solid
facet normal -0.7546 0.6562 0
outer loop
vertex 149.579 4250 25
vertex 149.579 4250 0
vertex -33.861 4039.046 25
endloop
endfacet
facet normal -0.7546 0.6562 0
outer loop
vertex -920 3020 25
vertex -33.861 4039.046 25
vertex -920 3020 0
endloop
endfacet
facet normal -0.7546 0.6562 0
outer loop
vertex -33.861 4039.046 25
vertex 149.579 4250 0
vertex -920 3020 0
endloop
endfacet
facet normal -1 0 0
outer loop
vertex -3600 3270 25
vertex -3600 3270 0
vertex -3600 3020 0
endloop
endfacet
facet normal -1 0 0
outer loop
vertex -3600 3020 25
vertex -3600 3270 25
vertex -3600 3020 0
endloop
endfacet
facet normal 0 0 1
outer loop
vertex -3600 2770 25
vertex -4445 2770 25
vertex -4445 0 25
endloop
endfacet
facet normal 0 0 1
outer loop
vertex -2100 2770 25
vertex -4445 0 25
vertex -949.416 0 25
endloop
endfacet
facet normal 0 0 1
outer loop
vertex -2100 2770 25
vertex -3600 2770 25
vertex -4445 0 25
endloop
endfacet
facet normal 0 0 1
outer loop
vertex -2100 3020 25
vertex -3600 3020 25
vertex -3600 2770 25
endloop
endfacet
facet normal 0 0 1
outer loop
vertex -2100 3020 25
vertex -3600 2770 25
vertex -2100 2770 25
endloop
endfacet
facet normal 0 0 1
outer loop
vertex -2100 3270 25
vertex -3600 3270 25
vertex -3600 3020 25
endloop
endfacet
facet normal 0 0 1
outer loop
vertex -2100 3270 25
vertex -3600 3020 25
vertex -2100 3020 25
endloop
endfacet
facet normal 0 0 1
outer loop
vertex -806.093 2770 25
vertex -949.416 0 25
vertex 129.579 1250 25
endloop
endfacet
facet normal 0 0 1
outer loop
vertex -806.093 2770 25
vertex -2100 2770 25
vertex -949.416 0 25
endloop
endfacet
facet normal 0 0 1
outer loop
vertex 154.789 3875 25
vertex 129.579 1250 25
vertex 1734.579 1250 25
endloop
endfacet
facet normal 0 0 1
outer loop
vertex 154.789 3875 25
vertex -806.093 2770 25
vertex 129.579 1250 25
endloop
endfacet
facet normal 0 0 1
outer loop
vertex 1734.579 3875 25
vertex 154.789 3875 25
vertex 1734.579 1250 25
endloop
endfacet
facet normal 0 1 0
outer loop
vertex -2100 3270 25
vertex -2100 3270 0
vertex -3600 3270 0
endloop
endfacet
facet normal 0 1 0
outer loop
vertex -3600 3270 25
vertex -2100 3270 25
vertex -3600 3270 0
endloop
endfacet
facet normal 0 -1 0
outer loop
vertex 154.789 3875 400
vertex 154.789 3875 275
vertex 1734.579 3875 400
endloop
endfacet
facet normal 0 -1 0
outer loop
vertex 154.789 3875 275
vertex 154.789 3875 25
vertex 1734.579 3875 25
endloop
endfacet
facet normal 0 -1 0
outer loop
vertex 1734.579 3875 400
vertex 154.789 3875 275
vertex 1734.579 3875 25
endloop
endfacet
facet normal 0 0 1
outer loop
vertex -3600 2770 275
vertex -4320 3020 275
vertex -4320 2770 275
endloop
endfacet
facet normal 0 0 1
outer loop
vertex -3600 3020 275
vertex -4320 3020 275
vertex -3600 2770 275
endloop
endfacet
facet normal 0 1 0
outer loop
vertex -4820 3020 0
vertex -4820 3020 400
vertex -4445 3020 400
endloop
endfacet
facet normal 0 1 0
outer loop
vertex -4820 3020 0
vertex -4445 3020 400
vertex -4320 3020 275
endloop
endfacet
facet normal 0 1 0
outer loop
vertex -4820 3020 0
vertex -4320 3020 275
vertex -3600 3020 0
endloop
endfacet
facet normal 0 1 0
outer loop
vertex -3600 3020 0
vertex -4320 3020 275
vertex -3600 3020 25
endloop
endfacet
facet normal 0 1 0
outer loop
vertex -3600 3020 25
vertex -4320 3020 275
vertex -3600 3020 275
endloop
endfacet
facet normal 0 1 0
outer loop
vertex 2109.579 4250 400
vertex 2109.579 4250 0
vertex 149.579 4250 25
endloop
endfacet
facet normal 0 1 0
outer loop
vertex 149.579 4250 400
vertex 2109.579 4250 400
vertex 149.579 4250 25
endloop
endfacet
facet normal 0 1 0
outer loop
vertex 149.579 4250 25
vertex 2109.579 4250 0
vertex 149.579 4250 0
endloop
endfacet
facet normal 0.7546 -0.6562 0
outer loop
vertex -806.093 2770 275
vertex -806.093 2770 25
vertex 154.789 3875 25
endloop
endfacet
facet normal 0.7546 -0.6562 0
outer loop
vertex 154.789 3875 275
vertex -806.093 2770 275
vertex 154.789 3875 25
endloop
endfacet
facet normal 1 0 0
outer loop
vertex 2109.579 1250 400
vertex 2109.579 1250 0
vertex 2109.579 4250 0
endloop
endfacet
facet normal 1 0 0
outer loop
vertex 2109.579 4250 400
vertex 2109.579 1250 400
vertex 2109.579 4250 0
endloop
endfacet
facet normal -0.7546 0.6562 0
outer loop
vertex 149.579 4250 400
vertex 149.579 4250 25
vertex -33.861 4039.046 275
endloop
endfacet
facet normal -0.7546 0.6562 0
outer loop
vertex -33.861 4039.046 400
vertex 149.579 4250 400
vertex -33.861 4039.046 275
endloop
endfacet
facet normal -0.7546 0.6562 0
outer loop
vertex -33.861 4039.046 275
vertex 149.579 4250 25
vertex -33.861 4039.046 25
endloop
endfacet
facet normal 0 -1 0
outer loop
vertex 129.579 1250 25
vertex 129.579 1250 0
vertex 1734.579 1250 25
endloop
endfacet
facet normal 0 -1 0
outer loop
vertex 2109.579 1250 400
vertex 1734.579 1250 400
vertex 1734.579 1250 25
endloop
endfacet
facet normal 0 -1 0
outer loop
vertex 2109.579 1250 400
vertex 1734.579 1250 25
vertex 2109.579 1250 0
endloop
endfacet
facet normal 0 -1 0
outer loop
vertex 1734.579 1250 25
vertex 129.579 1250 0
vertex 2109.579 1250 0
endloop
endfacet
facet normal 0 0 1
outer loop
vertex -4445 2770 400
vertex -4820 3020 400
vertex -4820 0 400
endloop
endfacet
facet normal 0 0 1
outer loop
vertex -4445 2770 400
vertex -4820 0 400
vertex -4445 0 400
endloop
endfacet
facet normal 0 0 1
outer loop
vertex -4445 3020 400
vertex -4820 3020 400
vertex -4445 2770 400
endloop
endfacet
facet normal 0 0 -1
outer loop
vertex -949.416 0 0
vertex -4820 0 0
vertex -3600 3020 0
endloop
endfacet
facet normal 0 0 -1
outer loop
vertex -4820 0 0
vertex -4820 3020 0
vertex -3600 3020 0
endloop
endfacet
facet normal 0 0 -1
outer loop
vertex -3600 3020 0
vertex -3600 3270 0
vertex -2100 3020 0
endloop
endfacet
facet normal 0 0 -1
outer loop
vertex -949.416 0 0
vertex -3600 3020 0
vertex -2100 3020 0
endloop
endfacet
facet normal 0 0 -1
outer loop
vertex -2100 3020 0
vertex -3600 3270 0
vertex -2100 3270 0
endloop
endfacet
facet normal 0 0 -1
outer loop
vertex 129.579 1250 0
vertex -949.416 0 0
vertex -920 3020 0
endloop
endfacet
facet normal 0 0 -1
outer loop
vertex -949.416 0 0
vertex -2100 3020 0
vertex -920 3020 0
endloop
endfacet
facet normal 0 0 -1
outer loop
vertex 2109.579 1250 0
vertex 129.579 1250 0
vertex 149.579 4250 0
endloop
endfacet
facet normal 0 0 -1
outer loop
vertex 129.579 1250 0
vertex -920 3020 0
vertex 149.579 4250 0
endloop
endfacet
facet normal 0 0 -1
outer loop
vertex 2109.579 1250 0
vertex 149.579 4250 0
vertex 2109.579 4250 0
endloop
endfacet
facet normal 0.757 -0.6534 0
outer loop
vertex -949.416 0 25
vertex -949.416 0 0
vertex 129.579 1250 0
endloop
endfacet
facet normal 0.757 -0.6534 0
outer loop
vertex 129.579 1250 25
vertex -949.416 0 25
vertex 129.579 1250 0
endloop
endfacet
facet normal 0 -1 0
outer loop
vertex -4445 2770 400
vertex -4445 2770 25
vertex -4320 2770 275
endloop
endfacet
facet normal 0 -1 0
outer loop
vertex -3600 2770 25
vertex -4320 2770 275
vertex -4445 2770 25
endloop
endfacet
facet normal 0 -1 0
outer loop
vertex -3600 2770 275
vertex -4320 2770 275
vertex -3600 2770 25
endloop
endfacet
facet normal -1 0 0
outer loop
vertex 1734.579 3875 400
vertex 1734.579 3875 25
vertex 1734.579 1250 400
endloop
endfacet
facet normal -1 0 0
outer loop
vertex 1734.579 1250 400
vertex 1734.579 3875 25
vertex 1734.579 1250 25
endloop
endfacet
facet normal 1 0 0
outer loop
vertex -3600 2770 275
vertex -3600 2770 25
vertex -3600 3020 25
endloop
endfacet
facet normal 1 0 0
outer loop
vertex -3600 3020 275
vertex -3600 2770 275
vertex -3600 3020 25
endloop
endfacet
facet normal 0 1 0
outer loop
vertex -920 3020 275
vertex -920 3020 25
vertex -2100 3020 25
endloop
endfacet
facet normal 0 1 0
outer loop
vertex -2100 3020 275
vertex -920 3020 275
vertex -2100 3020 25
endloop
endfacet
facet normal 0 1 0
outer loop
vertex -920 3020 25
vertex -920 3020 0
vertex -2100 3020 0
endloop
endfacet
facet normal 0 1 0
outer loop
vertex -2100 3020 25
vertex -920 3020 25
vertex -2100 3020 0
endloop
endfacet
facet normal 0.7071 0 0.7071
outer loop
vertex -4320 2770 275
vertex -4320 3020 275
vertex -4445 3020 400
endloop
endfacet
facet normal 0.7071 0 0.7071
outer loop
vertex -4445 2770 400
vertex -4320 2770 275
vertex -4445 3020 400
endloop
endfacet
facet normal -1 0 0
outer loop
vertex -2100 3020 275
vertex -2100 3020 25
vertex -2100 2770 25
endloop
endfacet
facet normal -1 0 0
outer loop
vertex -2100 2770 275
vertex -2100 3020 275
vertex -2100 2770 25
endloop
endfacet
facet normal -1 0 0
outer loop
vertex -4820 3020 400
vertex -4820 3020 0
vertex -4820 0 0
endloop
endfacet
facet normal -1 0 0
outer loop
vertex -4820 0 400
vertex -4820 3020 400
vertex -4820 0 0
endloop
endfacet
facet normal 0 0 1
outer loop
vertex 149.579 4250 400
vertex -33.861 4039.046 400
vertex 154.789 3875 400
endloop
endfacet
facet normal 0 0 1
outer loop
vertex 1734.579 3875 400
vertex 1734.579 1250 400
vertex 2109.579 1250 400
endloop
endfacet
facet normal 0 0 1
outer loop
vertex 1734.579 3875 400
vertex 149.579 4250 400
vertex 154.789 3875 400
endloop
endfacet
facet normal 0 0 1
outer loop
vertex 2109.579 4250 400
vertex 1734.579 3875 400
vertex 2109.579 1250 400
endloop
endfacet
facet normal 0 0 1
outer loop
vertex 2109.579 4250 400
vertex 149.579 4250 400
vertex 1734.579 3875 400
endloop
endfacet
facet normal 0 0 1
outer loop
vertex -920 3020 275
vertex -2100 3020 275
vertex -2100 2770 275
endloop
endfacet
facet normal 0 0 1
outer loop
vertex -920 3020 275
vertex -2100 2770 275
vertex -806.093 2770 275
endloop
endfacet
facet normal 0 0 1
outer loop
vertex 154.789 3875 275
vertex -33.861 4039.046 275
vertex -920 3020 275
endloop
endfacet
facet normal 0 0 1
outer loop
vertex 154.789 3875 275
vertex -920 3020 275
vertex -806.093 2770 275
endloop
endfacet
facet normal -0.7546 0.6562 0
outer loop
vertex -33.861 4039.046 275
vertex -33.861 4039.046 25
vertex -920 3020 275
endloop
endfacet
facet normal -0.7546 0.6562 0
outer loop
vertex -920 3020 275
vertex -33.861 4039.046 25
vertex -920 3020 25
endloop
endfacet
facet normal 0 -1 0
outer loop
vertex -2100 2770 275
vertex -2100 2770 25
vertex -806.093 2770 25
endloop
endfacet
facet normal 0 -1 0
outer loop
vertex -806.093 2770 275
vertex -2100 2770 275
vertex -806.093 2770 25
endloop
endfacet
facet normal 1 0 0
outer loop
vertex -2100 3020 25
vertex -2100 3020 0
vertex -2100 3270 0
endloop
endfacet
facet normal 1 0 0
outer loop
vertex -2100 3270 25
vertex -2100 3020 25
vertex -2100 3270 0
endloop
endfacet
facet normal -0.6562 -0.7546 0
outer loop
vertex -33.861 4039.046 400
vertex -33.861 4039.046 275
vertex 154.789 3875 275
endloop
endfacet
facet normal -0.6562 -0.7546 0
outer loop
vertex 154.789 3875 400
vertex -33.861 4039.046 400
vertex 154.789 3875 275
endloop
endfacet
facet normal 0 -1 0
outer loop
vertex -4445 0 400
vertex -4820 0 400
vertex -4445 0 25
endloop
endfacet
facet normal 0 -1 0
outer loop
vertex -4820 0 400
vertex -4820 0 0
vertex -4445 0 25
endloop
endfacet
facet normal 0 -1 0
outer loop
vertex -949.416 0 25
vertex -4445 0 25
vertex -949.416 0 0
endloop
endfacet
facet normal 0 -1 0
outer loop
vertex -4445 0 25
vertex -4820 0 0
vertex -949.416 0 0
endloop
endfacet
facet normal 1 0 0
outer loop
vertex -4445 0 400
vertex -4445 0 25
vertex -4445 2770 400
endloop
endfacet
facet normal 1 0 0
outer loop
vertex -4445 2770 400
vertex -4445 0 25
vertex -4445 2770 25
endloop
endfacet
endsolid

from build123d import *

# Parameters (mm, degrees)
F1_DEPTH = 25
F5_DEPTH = 375
F6_W     = 845
F6_H     = 250
F7_DEPTH = 250
F9_DEPTH = 250


with BuildPart() as f1:
    # F0 (on Top) → F1 (new body)
    with BuildSketch(Plane.XY):
        Polygon((-4820, 0), (-949.416399, 0), (129.579357, 1250), (2109.579357, 1250), (2109.579357, 4250), (149.579357, 4250), (-920, 3020), (-2100, 3020), (-2100, 3270), (-3600, 3270), (-3600, 3020), (-4820, 3020), align=None)
    extrude(amount=F1_DEPTH)

    # F4 (on face) → F5 (join)
    with BuildSketch(Plane.XY.offset(25)):
        Polygon((-4820, 3020), (-4820, 0), (-4445, 0), (-4445, 2645), (-4445, 3020), align=None)
        Polygon((2109.579357, 4250), (154.788902, 4250), (149.579357, 4250), (-33.861404, 4039.045914), (154.788902, 3875), (1734.579357, 3875), (1734.579357, 1250), (2109.579357, 1250), align=None)
    extrude(amount=F5_DEPTH)

    # F6 (on face) → F7 (join)
    with BuildSketch(Plane.XY.offset(25)):
        with Locations((-4022.5, 2895)):
            Rectangle(F6_W, F6_H)
        Polygon((-920, 3020), (-2100, 3020), (-2100, 2770), (-806.093365, 2770), (154.788902, 3875), (-33.861404, 4039.045914), align=None)
    extrude(amount=F7_DEPTH)

    # F8 (on face) → F9 (join, through all)
    with BuildSketch(Plane.XZ.offset(-2770)):
        Polygon((-4445, 400), (-4445, 275), (-4320, 275), align=None)
    extrude(amount=-F9_DEPTH)


solid = f1.part
